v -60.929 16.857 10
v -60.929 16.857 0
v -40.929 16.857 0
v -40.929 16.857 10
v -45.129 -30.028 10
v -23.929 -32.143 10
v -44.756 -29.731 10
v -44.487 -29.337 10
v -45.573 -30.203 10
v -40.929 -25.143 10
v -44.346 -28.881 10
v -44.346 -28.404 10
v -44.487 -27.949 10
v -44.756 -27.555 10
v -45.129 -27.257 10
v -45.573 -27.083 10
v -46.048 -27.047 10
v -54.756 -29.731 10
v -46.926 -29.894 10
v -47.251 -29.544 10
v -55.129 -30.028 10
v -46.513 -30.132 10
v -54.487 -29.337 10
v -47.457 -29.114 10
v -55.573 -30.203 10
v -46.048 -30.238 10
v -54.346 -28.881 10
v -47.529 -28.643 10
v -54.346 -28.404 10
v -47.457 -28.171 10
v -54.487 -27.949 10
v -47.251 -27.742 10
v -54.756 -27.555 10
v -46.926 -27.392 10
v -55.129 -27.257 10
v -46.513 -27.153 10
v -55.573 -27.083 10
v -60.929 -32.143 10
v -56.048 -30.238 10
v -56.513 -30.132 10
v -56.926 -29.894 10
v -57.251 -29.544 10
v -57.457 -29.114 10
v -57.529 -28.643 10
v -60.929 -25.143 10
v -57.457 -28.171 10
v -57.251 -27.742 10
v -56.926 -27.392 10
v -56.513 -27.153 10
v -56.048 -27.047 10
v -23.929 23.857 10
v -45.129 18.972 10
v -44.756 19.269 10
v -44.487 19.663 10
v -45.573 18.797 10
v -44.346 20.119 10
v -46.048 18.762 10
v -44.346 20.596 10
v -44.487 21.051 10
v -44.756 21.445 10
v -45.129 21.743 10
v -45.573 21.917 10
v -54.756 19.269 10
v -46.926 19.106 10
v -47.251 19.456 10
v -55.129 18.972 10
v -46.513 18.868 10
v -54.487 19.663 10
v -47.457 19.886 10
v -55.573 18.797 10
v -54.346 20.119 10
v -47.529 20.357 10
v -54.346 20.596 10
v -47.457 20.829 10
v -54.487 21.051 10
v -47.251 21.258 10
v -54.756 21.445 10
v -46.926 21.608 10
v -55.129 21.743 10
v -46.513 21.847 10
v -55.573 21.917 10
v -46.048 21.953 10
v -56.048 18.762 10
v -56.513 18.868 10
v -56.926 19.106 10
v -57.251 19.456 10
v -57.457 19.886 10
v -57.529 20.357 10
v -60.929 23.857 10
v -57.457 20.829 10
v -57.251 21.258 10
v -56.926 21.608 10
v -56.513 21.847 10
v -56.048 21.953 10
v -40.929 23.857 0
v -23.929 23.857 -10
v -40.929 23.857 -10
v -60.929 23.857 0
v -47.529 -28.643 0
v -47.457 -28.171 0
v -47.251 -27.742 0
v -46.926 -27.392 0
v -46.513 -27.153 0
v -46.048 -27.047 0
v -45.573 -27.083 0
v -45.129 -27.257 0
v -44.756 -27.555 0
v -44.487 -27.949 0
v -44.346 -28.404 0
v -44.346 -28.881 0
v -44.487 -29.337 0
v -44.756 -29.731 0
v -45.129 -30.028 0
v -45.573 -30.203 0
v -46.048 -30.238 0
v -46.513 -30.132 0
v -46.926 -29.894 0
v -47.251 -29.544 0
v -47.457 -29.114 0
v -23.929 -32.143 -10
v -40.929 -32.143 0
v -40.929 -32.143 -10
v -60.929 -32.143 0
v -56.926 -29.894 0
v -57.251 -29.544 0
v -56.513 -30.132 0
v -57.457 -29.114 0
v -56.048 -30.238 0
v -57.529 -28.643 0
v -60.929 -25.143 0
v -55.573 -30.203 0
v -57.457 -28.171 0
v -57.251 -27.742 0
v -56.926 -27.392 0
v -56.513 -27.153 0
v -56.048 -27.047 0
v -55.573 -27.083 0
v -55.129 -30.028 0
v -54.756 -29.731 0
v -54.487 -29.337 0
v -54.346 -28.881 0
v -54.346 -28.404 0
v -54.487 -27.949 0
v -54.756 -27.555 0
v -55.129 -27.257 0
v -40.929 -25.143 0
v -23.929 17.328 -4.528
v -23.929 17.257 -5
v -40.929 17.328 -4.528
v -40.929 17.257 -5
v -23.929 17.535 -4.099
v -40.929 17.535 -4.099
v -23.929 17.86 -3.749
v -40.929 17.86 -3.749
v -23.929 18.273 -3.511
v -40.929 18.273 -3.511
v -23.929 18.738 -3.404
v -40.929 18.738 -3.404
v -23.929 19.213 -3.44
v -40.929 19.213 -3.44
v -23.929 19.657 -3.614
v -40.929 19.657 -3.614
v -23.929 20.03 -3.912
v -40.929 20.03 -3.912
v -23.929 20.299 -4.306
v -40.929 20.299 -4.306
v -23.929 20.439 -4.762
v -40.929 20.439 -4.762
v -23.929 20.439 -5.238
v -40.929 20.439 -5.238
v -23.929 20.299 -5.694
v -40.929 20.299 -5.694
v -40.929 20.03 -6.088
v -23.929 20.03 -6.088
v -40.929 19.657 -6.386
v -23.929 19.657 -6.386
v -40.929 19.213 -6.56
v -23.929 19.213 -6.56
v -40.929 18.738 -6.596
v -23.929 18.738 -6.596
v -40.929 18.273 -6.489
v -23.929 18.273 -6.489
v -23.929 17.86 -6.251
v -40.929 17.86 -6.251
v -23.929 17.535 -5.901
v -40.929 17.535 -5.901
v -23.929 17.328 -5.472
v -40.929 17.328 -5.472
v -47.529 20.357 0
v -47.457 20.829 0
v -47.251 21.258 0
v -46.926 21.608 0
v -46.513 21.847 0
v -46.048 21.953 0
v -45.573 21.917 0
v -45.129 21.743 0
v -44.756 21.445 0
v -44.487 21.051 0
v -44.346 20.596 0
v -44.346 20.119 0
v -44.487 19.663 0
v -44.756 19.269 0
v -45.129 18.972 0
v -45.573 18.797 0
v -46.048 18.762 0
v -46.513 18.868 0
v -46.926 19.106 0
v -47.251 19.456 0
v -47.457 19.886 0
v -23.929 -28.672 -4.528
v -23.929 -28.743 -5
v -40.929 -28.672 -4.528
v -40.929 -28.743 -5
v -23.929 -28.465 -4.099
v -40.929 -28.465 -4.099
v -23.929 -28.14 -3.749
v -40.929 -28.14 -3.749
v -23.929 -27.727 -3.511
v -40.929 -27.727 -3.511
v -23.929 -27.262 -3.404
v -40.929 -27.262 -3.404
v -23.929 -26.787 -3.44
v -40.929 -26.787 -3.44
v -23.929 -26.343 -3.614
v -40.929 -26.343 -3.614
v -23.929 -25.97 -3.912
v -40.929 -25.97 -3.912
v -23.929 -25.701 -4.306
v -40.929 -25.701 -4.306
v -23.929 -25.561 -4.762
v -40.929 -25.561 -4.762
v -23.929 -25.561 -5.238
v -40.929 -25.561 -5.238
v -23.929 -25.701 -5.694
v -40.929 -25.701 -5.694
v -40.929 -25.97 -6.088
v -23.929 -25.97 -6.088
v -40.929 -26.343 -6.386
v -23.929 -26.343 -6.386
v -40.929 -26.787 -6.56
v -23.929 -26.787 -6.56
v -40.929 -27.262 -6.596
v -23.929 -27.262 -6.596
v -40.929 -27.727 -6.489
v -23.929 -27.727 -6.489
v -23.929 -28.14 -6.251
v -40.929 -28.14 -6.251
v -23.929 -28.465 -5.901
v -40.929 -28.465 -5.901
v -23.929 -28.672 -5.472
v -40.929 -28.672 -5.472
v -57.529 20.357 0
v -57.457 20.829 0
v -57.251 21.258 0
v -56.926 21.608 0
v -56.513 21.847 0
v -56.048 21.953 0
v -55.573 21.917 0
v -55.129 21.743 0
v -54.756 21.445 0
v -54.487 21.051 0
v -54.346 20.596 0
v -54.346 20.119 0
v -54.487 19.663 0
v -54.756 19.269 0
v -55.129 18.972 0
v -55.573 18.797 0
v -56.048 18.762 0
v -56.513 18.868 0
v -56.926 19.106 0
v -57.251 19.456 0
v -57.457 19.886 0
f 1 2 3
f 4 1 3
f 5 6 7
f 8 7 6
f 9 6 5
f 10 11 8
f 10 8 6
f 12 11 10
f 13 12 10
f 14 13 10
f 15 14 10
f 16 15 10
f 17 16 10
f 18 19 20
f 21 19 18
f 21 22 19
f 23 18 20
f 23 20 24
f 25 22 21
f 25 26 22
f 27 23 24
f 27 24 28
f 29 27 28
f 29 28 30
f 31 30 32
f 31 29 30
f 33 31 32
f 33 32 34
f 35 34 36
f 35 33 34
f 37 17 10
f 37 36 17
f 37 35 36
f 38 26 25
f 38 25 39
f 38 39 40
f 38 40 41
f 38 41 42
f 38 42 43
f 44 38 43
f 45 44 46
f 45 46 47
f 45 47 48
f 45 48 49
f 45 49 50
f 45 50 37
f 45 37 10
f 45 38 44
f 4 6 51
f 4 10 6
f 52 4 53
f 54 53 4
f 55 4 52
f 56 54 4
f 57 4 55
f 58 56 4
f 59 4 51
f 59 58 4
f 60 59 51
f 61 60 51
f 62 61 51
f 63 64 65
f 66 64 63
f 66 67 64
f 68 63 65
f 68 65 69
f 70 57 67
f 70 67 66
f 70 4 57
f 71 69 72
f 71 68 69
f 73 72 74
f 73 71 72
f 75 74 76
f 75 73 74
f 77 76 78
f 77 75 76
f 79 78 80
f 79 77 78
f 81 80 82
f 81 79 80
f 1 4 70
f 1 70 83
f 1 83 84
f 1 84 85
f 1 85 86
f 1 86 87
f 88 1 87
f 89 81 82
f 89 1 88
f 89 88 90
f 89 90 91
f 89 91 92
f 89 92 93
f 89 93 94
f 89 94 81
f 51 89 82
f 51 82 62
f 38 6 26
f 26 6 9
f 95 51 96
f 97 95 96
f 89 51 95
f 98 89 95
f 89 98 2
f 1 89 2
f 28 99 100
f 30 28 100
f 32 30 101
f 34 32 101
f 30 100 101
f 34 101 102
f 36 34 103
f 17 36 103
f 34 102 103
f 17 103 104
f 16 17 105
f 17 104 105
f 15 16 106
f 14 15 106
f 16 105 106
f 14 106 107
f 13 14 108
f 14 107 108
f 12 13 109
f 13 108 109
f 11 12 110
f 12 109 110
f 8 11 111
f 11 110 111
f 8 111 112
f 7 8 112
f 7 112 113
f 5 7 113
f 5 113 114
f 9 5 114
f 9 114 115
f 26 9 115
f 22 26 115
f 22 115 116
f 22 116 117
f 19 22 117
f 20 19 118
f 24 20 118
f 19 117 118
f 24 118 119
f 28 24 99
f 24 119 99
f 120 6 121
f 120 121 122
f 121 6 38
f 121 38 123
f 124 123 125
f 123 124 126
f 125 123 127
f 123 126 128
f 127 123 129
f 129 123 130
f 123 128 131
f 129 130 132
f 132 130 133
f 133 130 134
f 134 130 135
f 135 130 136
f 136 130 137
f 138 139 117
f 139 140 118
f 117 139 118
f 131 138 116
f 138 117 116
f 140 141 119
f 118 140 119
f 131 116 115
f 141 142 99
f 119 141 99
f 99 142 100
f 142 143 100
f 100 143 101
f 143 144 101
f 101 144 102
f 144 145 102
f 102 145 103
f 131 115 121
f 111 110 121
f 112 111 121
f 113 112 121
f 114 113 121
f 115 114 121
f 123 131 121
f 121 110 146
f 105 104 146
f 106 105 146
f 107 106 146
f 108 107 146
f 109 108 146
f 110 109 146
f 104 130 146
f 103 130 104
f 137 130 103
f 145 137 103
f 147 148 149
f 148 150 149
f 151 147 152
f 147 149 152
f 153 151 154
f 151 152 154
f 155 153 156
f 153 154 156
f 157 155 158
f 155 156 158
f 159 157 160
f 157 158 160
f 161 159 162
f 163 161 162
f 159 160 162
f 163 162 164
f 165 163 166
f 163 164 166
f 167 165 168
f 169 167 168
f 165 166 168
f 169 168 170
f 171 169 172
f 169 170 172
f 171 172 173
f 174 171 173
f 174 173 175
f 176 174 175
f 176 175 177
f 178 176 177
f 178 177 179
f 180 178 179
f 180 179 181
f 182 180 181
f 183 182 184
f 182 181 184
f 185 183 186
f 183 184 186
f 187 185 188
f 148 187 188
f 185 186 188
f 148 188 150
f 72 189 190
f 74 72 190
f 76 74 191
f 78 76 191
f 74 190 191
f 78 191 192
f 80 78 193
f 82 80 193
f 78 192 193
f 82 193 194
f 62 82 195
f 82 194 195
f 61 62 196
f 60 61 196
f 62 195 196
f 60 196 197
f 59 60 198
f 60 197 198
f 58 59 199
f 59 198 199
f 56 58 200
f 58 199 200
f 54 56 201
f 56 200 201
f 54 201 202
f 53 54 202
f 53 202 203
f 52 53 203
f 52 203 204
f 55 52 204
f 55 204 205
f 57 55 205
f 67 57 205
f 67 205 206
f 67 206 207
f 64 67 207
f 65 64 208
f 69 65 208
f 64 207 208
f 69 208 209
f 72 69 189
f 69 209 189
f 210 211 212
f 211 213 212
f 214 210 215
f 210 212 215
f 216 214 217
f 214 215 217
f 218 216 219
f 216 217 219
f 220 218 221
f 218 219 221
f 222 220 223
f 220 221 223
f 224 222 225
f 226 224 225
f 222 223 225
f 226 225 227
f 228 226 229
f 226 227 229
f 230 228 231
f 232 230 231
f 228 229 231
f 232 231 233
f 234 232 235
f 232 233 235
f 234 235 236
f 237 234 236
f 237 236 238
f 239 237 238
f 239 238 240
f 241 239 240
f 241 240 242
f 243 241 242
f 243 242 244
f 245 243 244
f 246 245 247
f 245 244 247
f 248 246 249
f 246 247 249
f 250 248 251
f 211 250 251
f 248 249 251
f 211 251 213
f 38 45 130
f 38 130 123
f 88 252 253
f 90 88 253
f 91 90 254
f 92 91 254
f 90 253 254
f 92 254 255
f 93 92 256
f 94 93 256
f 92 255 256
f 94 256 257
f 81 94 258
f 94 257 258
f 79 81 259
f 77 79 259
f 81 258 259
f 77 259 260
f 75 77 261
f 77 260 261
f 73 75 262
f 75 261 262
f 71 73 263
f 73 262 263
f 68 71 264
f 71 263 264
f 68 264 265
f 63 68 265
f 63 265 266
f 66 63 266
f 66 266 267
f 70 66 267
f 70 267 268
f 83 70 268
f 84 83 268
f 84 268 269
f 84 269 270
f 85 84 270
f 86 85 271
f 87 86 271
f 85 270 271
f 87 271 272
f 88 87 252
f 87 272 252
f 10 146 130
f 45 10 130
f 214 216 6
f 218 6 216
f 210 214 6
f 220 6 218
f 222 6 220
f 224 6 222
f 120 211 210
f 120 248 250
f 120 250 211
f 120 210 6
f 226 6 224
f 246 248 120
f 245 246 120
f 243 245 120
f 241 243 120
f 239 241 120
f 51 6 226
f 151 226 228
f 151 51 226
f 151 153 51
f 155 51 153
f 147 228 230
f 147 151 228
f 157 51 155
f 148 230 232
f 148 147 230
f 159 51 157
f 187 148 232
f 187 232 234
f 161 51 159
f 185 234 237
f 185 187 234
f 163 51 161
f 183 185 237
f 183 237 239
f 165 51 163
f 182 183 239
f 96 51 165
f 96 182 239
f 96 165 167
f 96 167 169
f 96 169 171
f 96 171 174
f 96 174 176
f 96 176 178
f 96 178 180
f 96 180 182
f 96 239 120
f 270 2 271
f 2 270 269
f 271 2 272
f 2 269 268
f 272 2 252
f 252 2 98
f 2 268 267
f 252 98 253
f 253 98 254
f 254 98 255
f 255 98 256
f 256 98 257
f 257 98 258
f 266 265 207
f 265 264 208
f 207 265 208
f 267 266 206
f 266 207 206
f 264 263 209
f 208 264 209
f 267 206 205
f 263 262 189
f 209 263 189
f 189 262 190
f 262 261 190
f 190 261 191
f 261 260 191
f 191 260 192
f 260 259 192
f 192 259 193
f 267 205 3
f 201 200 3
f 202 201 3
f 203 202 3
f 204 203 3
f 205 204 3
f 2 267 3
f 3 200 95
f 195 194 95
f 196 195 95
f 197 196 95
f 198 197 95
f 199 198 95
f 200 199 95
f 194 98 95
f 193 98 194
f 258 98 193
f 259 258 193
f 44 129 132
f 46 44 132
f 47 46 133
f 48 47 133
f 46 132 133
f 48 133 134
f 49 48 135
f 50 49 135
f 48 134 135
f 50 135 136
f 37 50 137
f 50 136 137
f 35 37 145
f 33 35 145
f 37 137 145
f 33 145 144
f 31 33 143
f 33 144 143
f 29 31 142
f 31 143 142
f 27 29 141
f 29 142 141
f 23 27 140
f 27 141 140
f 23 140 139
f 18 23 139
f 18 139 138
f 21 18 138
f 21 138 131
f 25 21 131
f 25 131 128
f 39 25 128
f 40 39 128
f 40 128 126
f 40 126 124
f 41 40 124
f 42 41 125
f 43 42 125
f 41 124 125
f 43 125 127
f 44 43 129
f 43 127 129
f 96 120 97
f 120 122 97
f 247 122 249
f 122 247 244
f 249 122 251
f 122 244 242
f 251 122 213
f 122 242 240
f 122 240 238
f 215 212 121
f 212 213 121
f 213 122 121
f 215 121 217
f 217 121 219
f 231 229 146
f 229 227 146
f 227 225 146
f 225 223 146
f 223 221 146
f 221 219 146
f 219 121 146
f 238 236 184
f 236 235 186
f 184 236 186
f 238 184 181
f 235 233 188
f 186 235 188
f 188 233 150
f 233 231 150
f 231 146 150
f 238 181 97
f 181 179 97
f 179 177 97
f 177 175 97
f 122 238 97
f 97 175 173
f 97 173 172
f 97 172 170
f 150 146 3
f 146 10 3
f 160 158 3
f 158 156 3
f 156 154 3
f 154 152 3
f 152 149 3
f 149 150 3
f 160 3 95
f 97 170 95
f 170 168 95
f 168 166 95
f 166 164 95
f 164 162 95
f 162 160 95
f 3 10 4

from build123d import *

# Parameters (mm, degrees)
EXTRUDE_1_DEPTH          = 10
SKETCH_2_R               = 1.6
CUT_EXTRUDE_1_DEPTH      = 10
SKETCH_3_W               = 7
SKETCH_3_H               = 56
EXTRUDE_2_DEPTH          = 10
CUT_EXTRUDE_2_DEPTH      = 40.155628782
CUT_EXTRUDE_2_DEPTH_BACK = 40.155628782
SKETCH_4_R               = 1.6
SKETCH_5_W               = 20
SKETCH_5_H               = 56
EXTRUDE_3_DEPTH          = 10
SKETCH_6_R               = 1.6
CUT_EXTRUDE_3_DEPTH      = 40.155628782


with BuildPart() as part:
    # ｽｹｯﾁ1 → ﾎﾞｽ - 押し出し1 (new body)
    with BuildSketch(Plane.XY):
        Polygon((-60.928571429, 23.857142857), (-60.928571429, 16.857142857), (-40.928571429, 16.857142857), (-40.928571429, -25.142857143), (-60.928571429, -25.142857143), (-60.928571429, -32.142857143), (-33.928571429, -32.142857143), (-33.928571429, 23.857142857), align=None)
    extrude(amount=EXTRUDE_1_DEPTH)

    # ｽｹｯﾁ2 → ｶｯﾄ - 押し出し1 (cut)
    with BuildSketch(Plane(origin=(0, 0, 0), x_dir=(-1, 0, 0), z_dir=(0, 0, -1))):
        with Locations((45.928571429, 20.357142857)):
            Circle(SKETCH_2_R)
        with Locations((55.928571429, 20.357142857)):
            Circle(SKETCH_2_R)
        with Locations((45.928571429, -28.642857143)):
            Circle(SKETCH_2_R)
        with Locations((55.928571429, -28.642857143)):
            Circle(SKETCH_2_R)
    extrude(amount=-CUT_EXTRUDE_1_DEPTH, mode=Mode.SUBTRACT)

    # ｽｹｯﾁ3 → ﾎﾞｽ - 押し出し2 (add)
    with BuildSketch(Plane(origin=(0, 0, 0), x_dir=(-1, 0, 0), z_dir=(0, 0, -1))):
        with Locations((37.428571429, -4.142857143)):
            Rectangle(SKETCH_3_W, SKETCH_3_H)
    extrude(amount=EXTRUDE_2_DEPTH)

    # ｽｹｯﾁ4 → ｶｯﾄ - 押し出し2 (cut, two sides: drawn at the far end of the back side and taken through both)
    with BuildSketch(Plane.ZY.offset(40.928571429).offset(-CUT_EXTRUDE_2_DEPTH_BACK)):
        with Locations(Location((-5, 18.857142857, 0), (0, 0, 270))):
            Circle(SKETCH_4_R)
        with Locations(Location((-5, -27.142857143, 0), (0, 0, 270))):
            Circle(SKETCH_4_R)
    extrude(amount=CUT_EXTRUDE_2_DEPTH + CUT_EXTRUDE_2_DEPTH_BACK, mode=Mode.SUBTRACT)

    # ｽｹｯﾁ5 → ﾎﾞｽ - 押し出し3 (add)
    with BuildSketch(Plane(origin=(-33.928571429, 0, 0), x_dir=(0, 0, -1), z_dir=(1, 0, 0))):
        with Locations((0, -4.142857143)):
            Rectangle(SKETCH_5_W, SKETCH_5_H)
    extrude(amount=EXTRUDE_3_DEPTH)

    # ｽｹｯﾁ6 → ｶｯﾄ - 押し出し3 (cut, through all)
    with BuildSketch(Plane.ZY.offset(40.928571429)):
        with Locations(Location((-5, 18.857142857, 0), (0, 0, 270))):
            Circle(SKETCH_6_R)
        with Locations(Location((-5, -27.142857143, 0), (0, 0, 270))):
            Circle(SKETCH_6_R)
    extrude(amount=-CUT_EXTRUDE_3_DEPTH, mode=Mode.SUBTRACT)


solid = part.part
